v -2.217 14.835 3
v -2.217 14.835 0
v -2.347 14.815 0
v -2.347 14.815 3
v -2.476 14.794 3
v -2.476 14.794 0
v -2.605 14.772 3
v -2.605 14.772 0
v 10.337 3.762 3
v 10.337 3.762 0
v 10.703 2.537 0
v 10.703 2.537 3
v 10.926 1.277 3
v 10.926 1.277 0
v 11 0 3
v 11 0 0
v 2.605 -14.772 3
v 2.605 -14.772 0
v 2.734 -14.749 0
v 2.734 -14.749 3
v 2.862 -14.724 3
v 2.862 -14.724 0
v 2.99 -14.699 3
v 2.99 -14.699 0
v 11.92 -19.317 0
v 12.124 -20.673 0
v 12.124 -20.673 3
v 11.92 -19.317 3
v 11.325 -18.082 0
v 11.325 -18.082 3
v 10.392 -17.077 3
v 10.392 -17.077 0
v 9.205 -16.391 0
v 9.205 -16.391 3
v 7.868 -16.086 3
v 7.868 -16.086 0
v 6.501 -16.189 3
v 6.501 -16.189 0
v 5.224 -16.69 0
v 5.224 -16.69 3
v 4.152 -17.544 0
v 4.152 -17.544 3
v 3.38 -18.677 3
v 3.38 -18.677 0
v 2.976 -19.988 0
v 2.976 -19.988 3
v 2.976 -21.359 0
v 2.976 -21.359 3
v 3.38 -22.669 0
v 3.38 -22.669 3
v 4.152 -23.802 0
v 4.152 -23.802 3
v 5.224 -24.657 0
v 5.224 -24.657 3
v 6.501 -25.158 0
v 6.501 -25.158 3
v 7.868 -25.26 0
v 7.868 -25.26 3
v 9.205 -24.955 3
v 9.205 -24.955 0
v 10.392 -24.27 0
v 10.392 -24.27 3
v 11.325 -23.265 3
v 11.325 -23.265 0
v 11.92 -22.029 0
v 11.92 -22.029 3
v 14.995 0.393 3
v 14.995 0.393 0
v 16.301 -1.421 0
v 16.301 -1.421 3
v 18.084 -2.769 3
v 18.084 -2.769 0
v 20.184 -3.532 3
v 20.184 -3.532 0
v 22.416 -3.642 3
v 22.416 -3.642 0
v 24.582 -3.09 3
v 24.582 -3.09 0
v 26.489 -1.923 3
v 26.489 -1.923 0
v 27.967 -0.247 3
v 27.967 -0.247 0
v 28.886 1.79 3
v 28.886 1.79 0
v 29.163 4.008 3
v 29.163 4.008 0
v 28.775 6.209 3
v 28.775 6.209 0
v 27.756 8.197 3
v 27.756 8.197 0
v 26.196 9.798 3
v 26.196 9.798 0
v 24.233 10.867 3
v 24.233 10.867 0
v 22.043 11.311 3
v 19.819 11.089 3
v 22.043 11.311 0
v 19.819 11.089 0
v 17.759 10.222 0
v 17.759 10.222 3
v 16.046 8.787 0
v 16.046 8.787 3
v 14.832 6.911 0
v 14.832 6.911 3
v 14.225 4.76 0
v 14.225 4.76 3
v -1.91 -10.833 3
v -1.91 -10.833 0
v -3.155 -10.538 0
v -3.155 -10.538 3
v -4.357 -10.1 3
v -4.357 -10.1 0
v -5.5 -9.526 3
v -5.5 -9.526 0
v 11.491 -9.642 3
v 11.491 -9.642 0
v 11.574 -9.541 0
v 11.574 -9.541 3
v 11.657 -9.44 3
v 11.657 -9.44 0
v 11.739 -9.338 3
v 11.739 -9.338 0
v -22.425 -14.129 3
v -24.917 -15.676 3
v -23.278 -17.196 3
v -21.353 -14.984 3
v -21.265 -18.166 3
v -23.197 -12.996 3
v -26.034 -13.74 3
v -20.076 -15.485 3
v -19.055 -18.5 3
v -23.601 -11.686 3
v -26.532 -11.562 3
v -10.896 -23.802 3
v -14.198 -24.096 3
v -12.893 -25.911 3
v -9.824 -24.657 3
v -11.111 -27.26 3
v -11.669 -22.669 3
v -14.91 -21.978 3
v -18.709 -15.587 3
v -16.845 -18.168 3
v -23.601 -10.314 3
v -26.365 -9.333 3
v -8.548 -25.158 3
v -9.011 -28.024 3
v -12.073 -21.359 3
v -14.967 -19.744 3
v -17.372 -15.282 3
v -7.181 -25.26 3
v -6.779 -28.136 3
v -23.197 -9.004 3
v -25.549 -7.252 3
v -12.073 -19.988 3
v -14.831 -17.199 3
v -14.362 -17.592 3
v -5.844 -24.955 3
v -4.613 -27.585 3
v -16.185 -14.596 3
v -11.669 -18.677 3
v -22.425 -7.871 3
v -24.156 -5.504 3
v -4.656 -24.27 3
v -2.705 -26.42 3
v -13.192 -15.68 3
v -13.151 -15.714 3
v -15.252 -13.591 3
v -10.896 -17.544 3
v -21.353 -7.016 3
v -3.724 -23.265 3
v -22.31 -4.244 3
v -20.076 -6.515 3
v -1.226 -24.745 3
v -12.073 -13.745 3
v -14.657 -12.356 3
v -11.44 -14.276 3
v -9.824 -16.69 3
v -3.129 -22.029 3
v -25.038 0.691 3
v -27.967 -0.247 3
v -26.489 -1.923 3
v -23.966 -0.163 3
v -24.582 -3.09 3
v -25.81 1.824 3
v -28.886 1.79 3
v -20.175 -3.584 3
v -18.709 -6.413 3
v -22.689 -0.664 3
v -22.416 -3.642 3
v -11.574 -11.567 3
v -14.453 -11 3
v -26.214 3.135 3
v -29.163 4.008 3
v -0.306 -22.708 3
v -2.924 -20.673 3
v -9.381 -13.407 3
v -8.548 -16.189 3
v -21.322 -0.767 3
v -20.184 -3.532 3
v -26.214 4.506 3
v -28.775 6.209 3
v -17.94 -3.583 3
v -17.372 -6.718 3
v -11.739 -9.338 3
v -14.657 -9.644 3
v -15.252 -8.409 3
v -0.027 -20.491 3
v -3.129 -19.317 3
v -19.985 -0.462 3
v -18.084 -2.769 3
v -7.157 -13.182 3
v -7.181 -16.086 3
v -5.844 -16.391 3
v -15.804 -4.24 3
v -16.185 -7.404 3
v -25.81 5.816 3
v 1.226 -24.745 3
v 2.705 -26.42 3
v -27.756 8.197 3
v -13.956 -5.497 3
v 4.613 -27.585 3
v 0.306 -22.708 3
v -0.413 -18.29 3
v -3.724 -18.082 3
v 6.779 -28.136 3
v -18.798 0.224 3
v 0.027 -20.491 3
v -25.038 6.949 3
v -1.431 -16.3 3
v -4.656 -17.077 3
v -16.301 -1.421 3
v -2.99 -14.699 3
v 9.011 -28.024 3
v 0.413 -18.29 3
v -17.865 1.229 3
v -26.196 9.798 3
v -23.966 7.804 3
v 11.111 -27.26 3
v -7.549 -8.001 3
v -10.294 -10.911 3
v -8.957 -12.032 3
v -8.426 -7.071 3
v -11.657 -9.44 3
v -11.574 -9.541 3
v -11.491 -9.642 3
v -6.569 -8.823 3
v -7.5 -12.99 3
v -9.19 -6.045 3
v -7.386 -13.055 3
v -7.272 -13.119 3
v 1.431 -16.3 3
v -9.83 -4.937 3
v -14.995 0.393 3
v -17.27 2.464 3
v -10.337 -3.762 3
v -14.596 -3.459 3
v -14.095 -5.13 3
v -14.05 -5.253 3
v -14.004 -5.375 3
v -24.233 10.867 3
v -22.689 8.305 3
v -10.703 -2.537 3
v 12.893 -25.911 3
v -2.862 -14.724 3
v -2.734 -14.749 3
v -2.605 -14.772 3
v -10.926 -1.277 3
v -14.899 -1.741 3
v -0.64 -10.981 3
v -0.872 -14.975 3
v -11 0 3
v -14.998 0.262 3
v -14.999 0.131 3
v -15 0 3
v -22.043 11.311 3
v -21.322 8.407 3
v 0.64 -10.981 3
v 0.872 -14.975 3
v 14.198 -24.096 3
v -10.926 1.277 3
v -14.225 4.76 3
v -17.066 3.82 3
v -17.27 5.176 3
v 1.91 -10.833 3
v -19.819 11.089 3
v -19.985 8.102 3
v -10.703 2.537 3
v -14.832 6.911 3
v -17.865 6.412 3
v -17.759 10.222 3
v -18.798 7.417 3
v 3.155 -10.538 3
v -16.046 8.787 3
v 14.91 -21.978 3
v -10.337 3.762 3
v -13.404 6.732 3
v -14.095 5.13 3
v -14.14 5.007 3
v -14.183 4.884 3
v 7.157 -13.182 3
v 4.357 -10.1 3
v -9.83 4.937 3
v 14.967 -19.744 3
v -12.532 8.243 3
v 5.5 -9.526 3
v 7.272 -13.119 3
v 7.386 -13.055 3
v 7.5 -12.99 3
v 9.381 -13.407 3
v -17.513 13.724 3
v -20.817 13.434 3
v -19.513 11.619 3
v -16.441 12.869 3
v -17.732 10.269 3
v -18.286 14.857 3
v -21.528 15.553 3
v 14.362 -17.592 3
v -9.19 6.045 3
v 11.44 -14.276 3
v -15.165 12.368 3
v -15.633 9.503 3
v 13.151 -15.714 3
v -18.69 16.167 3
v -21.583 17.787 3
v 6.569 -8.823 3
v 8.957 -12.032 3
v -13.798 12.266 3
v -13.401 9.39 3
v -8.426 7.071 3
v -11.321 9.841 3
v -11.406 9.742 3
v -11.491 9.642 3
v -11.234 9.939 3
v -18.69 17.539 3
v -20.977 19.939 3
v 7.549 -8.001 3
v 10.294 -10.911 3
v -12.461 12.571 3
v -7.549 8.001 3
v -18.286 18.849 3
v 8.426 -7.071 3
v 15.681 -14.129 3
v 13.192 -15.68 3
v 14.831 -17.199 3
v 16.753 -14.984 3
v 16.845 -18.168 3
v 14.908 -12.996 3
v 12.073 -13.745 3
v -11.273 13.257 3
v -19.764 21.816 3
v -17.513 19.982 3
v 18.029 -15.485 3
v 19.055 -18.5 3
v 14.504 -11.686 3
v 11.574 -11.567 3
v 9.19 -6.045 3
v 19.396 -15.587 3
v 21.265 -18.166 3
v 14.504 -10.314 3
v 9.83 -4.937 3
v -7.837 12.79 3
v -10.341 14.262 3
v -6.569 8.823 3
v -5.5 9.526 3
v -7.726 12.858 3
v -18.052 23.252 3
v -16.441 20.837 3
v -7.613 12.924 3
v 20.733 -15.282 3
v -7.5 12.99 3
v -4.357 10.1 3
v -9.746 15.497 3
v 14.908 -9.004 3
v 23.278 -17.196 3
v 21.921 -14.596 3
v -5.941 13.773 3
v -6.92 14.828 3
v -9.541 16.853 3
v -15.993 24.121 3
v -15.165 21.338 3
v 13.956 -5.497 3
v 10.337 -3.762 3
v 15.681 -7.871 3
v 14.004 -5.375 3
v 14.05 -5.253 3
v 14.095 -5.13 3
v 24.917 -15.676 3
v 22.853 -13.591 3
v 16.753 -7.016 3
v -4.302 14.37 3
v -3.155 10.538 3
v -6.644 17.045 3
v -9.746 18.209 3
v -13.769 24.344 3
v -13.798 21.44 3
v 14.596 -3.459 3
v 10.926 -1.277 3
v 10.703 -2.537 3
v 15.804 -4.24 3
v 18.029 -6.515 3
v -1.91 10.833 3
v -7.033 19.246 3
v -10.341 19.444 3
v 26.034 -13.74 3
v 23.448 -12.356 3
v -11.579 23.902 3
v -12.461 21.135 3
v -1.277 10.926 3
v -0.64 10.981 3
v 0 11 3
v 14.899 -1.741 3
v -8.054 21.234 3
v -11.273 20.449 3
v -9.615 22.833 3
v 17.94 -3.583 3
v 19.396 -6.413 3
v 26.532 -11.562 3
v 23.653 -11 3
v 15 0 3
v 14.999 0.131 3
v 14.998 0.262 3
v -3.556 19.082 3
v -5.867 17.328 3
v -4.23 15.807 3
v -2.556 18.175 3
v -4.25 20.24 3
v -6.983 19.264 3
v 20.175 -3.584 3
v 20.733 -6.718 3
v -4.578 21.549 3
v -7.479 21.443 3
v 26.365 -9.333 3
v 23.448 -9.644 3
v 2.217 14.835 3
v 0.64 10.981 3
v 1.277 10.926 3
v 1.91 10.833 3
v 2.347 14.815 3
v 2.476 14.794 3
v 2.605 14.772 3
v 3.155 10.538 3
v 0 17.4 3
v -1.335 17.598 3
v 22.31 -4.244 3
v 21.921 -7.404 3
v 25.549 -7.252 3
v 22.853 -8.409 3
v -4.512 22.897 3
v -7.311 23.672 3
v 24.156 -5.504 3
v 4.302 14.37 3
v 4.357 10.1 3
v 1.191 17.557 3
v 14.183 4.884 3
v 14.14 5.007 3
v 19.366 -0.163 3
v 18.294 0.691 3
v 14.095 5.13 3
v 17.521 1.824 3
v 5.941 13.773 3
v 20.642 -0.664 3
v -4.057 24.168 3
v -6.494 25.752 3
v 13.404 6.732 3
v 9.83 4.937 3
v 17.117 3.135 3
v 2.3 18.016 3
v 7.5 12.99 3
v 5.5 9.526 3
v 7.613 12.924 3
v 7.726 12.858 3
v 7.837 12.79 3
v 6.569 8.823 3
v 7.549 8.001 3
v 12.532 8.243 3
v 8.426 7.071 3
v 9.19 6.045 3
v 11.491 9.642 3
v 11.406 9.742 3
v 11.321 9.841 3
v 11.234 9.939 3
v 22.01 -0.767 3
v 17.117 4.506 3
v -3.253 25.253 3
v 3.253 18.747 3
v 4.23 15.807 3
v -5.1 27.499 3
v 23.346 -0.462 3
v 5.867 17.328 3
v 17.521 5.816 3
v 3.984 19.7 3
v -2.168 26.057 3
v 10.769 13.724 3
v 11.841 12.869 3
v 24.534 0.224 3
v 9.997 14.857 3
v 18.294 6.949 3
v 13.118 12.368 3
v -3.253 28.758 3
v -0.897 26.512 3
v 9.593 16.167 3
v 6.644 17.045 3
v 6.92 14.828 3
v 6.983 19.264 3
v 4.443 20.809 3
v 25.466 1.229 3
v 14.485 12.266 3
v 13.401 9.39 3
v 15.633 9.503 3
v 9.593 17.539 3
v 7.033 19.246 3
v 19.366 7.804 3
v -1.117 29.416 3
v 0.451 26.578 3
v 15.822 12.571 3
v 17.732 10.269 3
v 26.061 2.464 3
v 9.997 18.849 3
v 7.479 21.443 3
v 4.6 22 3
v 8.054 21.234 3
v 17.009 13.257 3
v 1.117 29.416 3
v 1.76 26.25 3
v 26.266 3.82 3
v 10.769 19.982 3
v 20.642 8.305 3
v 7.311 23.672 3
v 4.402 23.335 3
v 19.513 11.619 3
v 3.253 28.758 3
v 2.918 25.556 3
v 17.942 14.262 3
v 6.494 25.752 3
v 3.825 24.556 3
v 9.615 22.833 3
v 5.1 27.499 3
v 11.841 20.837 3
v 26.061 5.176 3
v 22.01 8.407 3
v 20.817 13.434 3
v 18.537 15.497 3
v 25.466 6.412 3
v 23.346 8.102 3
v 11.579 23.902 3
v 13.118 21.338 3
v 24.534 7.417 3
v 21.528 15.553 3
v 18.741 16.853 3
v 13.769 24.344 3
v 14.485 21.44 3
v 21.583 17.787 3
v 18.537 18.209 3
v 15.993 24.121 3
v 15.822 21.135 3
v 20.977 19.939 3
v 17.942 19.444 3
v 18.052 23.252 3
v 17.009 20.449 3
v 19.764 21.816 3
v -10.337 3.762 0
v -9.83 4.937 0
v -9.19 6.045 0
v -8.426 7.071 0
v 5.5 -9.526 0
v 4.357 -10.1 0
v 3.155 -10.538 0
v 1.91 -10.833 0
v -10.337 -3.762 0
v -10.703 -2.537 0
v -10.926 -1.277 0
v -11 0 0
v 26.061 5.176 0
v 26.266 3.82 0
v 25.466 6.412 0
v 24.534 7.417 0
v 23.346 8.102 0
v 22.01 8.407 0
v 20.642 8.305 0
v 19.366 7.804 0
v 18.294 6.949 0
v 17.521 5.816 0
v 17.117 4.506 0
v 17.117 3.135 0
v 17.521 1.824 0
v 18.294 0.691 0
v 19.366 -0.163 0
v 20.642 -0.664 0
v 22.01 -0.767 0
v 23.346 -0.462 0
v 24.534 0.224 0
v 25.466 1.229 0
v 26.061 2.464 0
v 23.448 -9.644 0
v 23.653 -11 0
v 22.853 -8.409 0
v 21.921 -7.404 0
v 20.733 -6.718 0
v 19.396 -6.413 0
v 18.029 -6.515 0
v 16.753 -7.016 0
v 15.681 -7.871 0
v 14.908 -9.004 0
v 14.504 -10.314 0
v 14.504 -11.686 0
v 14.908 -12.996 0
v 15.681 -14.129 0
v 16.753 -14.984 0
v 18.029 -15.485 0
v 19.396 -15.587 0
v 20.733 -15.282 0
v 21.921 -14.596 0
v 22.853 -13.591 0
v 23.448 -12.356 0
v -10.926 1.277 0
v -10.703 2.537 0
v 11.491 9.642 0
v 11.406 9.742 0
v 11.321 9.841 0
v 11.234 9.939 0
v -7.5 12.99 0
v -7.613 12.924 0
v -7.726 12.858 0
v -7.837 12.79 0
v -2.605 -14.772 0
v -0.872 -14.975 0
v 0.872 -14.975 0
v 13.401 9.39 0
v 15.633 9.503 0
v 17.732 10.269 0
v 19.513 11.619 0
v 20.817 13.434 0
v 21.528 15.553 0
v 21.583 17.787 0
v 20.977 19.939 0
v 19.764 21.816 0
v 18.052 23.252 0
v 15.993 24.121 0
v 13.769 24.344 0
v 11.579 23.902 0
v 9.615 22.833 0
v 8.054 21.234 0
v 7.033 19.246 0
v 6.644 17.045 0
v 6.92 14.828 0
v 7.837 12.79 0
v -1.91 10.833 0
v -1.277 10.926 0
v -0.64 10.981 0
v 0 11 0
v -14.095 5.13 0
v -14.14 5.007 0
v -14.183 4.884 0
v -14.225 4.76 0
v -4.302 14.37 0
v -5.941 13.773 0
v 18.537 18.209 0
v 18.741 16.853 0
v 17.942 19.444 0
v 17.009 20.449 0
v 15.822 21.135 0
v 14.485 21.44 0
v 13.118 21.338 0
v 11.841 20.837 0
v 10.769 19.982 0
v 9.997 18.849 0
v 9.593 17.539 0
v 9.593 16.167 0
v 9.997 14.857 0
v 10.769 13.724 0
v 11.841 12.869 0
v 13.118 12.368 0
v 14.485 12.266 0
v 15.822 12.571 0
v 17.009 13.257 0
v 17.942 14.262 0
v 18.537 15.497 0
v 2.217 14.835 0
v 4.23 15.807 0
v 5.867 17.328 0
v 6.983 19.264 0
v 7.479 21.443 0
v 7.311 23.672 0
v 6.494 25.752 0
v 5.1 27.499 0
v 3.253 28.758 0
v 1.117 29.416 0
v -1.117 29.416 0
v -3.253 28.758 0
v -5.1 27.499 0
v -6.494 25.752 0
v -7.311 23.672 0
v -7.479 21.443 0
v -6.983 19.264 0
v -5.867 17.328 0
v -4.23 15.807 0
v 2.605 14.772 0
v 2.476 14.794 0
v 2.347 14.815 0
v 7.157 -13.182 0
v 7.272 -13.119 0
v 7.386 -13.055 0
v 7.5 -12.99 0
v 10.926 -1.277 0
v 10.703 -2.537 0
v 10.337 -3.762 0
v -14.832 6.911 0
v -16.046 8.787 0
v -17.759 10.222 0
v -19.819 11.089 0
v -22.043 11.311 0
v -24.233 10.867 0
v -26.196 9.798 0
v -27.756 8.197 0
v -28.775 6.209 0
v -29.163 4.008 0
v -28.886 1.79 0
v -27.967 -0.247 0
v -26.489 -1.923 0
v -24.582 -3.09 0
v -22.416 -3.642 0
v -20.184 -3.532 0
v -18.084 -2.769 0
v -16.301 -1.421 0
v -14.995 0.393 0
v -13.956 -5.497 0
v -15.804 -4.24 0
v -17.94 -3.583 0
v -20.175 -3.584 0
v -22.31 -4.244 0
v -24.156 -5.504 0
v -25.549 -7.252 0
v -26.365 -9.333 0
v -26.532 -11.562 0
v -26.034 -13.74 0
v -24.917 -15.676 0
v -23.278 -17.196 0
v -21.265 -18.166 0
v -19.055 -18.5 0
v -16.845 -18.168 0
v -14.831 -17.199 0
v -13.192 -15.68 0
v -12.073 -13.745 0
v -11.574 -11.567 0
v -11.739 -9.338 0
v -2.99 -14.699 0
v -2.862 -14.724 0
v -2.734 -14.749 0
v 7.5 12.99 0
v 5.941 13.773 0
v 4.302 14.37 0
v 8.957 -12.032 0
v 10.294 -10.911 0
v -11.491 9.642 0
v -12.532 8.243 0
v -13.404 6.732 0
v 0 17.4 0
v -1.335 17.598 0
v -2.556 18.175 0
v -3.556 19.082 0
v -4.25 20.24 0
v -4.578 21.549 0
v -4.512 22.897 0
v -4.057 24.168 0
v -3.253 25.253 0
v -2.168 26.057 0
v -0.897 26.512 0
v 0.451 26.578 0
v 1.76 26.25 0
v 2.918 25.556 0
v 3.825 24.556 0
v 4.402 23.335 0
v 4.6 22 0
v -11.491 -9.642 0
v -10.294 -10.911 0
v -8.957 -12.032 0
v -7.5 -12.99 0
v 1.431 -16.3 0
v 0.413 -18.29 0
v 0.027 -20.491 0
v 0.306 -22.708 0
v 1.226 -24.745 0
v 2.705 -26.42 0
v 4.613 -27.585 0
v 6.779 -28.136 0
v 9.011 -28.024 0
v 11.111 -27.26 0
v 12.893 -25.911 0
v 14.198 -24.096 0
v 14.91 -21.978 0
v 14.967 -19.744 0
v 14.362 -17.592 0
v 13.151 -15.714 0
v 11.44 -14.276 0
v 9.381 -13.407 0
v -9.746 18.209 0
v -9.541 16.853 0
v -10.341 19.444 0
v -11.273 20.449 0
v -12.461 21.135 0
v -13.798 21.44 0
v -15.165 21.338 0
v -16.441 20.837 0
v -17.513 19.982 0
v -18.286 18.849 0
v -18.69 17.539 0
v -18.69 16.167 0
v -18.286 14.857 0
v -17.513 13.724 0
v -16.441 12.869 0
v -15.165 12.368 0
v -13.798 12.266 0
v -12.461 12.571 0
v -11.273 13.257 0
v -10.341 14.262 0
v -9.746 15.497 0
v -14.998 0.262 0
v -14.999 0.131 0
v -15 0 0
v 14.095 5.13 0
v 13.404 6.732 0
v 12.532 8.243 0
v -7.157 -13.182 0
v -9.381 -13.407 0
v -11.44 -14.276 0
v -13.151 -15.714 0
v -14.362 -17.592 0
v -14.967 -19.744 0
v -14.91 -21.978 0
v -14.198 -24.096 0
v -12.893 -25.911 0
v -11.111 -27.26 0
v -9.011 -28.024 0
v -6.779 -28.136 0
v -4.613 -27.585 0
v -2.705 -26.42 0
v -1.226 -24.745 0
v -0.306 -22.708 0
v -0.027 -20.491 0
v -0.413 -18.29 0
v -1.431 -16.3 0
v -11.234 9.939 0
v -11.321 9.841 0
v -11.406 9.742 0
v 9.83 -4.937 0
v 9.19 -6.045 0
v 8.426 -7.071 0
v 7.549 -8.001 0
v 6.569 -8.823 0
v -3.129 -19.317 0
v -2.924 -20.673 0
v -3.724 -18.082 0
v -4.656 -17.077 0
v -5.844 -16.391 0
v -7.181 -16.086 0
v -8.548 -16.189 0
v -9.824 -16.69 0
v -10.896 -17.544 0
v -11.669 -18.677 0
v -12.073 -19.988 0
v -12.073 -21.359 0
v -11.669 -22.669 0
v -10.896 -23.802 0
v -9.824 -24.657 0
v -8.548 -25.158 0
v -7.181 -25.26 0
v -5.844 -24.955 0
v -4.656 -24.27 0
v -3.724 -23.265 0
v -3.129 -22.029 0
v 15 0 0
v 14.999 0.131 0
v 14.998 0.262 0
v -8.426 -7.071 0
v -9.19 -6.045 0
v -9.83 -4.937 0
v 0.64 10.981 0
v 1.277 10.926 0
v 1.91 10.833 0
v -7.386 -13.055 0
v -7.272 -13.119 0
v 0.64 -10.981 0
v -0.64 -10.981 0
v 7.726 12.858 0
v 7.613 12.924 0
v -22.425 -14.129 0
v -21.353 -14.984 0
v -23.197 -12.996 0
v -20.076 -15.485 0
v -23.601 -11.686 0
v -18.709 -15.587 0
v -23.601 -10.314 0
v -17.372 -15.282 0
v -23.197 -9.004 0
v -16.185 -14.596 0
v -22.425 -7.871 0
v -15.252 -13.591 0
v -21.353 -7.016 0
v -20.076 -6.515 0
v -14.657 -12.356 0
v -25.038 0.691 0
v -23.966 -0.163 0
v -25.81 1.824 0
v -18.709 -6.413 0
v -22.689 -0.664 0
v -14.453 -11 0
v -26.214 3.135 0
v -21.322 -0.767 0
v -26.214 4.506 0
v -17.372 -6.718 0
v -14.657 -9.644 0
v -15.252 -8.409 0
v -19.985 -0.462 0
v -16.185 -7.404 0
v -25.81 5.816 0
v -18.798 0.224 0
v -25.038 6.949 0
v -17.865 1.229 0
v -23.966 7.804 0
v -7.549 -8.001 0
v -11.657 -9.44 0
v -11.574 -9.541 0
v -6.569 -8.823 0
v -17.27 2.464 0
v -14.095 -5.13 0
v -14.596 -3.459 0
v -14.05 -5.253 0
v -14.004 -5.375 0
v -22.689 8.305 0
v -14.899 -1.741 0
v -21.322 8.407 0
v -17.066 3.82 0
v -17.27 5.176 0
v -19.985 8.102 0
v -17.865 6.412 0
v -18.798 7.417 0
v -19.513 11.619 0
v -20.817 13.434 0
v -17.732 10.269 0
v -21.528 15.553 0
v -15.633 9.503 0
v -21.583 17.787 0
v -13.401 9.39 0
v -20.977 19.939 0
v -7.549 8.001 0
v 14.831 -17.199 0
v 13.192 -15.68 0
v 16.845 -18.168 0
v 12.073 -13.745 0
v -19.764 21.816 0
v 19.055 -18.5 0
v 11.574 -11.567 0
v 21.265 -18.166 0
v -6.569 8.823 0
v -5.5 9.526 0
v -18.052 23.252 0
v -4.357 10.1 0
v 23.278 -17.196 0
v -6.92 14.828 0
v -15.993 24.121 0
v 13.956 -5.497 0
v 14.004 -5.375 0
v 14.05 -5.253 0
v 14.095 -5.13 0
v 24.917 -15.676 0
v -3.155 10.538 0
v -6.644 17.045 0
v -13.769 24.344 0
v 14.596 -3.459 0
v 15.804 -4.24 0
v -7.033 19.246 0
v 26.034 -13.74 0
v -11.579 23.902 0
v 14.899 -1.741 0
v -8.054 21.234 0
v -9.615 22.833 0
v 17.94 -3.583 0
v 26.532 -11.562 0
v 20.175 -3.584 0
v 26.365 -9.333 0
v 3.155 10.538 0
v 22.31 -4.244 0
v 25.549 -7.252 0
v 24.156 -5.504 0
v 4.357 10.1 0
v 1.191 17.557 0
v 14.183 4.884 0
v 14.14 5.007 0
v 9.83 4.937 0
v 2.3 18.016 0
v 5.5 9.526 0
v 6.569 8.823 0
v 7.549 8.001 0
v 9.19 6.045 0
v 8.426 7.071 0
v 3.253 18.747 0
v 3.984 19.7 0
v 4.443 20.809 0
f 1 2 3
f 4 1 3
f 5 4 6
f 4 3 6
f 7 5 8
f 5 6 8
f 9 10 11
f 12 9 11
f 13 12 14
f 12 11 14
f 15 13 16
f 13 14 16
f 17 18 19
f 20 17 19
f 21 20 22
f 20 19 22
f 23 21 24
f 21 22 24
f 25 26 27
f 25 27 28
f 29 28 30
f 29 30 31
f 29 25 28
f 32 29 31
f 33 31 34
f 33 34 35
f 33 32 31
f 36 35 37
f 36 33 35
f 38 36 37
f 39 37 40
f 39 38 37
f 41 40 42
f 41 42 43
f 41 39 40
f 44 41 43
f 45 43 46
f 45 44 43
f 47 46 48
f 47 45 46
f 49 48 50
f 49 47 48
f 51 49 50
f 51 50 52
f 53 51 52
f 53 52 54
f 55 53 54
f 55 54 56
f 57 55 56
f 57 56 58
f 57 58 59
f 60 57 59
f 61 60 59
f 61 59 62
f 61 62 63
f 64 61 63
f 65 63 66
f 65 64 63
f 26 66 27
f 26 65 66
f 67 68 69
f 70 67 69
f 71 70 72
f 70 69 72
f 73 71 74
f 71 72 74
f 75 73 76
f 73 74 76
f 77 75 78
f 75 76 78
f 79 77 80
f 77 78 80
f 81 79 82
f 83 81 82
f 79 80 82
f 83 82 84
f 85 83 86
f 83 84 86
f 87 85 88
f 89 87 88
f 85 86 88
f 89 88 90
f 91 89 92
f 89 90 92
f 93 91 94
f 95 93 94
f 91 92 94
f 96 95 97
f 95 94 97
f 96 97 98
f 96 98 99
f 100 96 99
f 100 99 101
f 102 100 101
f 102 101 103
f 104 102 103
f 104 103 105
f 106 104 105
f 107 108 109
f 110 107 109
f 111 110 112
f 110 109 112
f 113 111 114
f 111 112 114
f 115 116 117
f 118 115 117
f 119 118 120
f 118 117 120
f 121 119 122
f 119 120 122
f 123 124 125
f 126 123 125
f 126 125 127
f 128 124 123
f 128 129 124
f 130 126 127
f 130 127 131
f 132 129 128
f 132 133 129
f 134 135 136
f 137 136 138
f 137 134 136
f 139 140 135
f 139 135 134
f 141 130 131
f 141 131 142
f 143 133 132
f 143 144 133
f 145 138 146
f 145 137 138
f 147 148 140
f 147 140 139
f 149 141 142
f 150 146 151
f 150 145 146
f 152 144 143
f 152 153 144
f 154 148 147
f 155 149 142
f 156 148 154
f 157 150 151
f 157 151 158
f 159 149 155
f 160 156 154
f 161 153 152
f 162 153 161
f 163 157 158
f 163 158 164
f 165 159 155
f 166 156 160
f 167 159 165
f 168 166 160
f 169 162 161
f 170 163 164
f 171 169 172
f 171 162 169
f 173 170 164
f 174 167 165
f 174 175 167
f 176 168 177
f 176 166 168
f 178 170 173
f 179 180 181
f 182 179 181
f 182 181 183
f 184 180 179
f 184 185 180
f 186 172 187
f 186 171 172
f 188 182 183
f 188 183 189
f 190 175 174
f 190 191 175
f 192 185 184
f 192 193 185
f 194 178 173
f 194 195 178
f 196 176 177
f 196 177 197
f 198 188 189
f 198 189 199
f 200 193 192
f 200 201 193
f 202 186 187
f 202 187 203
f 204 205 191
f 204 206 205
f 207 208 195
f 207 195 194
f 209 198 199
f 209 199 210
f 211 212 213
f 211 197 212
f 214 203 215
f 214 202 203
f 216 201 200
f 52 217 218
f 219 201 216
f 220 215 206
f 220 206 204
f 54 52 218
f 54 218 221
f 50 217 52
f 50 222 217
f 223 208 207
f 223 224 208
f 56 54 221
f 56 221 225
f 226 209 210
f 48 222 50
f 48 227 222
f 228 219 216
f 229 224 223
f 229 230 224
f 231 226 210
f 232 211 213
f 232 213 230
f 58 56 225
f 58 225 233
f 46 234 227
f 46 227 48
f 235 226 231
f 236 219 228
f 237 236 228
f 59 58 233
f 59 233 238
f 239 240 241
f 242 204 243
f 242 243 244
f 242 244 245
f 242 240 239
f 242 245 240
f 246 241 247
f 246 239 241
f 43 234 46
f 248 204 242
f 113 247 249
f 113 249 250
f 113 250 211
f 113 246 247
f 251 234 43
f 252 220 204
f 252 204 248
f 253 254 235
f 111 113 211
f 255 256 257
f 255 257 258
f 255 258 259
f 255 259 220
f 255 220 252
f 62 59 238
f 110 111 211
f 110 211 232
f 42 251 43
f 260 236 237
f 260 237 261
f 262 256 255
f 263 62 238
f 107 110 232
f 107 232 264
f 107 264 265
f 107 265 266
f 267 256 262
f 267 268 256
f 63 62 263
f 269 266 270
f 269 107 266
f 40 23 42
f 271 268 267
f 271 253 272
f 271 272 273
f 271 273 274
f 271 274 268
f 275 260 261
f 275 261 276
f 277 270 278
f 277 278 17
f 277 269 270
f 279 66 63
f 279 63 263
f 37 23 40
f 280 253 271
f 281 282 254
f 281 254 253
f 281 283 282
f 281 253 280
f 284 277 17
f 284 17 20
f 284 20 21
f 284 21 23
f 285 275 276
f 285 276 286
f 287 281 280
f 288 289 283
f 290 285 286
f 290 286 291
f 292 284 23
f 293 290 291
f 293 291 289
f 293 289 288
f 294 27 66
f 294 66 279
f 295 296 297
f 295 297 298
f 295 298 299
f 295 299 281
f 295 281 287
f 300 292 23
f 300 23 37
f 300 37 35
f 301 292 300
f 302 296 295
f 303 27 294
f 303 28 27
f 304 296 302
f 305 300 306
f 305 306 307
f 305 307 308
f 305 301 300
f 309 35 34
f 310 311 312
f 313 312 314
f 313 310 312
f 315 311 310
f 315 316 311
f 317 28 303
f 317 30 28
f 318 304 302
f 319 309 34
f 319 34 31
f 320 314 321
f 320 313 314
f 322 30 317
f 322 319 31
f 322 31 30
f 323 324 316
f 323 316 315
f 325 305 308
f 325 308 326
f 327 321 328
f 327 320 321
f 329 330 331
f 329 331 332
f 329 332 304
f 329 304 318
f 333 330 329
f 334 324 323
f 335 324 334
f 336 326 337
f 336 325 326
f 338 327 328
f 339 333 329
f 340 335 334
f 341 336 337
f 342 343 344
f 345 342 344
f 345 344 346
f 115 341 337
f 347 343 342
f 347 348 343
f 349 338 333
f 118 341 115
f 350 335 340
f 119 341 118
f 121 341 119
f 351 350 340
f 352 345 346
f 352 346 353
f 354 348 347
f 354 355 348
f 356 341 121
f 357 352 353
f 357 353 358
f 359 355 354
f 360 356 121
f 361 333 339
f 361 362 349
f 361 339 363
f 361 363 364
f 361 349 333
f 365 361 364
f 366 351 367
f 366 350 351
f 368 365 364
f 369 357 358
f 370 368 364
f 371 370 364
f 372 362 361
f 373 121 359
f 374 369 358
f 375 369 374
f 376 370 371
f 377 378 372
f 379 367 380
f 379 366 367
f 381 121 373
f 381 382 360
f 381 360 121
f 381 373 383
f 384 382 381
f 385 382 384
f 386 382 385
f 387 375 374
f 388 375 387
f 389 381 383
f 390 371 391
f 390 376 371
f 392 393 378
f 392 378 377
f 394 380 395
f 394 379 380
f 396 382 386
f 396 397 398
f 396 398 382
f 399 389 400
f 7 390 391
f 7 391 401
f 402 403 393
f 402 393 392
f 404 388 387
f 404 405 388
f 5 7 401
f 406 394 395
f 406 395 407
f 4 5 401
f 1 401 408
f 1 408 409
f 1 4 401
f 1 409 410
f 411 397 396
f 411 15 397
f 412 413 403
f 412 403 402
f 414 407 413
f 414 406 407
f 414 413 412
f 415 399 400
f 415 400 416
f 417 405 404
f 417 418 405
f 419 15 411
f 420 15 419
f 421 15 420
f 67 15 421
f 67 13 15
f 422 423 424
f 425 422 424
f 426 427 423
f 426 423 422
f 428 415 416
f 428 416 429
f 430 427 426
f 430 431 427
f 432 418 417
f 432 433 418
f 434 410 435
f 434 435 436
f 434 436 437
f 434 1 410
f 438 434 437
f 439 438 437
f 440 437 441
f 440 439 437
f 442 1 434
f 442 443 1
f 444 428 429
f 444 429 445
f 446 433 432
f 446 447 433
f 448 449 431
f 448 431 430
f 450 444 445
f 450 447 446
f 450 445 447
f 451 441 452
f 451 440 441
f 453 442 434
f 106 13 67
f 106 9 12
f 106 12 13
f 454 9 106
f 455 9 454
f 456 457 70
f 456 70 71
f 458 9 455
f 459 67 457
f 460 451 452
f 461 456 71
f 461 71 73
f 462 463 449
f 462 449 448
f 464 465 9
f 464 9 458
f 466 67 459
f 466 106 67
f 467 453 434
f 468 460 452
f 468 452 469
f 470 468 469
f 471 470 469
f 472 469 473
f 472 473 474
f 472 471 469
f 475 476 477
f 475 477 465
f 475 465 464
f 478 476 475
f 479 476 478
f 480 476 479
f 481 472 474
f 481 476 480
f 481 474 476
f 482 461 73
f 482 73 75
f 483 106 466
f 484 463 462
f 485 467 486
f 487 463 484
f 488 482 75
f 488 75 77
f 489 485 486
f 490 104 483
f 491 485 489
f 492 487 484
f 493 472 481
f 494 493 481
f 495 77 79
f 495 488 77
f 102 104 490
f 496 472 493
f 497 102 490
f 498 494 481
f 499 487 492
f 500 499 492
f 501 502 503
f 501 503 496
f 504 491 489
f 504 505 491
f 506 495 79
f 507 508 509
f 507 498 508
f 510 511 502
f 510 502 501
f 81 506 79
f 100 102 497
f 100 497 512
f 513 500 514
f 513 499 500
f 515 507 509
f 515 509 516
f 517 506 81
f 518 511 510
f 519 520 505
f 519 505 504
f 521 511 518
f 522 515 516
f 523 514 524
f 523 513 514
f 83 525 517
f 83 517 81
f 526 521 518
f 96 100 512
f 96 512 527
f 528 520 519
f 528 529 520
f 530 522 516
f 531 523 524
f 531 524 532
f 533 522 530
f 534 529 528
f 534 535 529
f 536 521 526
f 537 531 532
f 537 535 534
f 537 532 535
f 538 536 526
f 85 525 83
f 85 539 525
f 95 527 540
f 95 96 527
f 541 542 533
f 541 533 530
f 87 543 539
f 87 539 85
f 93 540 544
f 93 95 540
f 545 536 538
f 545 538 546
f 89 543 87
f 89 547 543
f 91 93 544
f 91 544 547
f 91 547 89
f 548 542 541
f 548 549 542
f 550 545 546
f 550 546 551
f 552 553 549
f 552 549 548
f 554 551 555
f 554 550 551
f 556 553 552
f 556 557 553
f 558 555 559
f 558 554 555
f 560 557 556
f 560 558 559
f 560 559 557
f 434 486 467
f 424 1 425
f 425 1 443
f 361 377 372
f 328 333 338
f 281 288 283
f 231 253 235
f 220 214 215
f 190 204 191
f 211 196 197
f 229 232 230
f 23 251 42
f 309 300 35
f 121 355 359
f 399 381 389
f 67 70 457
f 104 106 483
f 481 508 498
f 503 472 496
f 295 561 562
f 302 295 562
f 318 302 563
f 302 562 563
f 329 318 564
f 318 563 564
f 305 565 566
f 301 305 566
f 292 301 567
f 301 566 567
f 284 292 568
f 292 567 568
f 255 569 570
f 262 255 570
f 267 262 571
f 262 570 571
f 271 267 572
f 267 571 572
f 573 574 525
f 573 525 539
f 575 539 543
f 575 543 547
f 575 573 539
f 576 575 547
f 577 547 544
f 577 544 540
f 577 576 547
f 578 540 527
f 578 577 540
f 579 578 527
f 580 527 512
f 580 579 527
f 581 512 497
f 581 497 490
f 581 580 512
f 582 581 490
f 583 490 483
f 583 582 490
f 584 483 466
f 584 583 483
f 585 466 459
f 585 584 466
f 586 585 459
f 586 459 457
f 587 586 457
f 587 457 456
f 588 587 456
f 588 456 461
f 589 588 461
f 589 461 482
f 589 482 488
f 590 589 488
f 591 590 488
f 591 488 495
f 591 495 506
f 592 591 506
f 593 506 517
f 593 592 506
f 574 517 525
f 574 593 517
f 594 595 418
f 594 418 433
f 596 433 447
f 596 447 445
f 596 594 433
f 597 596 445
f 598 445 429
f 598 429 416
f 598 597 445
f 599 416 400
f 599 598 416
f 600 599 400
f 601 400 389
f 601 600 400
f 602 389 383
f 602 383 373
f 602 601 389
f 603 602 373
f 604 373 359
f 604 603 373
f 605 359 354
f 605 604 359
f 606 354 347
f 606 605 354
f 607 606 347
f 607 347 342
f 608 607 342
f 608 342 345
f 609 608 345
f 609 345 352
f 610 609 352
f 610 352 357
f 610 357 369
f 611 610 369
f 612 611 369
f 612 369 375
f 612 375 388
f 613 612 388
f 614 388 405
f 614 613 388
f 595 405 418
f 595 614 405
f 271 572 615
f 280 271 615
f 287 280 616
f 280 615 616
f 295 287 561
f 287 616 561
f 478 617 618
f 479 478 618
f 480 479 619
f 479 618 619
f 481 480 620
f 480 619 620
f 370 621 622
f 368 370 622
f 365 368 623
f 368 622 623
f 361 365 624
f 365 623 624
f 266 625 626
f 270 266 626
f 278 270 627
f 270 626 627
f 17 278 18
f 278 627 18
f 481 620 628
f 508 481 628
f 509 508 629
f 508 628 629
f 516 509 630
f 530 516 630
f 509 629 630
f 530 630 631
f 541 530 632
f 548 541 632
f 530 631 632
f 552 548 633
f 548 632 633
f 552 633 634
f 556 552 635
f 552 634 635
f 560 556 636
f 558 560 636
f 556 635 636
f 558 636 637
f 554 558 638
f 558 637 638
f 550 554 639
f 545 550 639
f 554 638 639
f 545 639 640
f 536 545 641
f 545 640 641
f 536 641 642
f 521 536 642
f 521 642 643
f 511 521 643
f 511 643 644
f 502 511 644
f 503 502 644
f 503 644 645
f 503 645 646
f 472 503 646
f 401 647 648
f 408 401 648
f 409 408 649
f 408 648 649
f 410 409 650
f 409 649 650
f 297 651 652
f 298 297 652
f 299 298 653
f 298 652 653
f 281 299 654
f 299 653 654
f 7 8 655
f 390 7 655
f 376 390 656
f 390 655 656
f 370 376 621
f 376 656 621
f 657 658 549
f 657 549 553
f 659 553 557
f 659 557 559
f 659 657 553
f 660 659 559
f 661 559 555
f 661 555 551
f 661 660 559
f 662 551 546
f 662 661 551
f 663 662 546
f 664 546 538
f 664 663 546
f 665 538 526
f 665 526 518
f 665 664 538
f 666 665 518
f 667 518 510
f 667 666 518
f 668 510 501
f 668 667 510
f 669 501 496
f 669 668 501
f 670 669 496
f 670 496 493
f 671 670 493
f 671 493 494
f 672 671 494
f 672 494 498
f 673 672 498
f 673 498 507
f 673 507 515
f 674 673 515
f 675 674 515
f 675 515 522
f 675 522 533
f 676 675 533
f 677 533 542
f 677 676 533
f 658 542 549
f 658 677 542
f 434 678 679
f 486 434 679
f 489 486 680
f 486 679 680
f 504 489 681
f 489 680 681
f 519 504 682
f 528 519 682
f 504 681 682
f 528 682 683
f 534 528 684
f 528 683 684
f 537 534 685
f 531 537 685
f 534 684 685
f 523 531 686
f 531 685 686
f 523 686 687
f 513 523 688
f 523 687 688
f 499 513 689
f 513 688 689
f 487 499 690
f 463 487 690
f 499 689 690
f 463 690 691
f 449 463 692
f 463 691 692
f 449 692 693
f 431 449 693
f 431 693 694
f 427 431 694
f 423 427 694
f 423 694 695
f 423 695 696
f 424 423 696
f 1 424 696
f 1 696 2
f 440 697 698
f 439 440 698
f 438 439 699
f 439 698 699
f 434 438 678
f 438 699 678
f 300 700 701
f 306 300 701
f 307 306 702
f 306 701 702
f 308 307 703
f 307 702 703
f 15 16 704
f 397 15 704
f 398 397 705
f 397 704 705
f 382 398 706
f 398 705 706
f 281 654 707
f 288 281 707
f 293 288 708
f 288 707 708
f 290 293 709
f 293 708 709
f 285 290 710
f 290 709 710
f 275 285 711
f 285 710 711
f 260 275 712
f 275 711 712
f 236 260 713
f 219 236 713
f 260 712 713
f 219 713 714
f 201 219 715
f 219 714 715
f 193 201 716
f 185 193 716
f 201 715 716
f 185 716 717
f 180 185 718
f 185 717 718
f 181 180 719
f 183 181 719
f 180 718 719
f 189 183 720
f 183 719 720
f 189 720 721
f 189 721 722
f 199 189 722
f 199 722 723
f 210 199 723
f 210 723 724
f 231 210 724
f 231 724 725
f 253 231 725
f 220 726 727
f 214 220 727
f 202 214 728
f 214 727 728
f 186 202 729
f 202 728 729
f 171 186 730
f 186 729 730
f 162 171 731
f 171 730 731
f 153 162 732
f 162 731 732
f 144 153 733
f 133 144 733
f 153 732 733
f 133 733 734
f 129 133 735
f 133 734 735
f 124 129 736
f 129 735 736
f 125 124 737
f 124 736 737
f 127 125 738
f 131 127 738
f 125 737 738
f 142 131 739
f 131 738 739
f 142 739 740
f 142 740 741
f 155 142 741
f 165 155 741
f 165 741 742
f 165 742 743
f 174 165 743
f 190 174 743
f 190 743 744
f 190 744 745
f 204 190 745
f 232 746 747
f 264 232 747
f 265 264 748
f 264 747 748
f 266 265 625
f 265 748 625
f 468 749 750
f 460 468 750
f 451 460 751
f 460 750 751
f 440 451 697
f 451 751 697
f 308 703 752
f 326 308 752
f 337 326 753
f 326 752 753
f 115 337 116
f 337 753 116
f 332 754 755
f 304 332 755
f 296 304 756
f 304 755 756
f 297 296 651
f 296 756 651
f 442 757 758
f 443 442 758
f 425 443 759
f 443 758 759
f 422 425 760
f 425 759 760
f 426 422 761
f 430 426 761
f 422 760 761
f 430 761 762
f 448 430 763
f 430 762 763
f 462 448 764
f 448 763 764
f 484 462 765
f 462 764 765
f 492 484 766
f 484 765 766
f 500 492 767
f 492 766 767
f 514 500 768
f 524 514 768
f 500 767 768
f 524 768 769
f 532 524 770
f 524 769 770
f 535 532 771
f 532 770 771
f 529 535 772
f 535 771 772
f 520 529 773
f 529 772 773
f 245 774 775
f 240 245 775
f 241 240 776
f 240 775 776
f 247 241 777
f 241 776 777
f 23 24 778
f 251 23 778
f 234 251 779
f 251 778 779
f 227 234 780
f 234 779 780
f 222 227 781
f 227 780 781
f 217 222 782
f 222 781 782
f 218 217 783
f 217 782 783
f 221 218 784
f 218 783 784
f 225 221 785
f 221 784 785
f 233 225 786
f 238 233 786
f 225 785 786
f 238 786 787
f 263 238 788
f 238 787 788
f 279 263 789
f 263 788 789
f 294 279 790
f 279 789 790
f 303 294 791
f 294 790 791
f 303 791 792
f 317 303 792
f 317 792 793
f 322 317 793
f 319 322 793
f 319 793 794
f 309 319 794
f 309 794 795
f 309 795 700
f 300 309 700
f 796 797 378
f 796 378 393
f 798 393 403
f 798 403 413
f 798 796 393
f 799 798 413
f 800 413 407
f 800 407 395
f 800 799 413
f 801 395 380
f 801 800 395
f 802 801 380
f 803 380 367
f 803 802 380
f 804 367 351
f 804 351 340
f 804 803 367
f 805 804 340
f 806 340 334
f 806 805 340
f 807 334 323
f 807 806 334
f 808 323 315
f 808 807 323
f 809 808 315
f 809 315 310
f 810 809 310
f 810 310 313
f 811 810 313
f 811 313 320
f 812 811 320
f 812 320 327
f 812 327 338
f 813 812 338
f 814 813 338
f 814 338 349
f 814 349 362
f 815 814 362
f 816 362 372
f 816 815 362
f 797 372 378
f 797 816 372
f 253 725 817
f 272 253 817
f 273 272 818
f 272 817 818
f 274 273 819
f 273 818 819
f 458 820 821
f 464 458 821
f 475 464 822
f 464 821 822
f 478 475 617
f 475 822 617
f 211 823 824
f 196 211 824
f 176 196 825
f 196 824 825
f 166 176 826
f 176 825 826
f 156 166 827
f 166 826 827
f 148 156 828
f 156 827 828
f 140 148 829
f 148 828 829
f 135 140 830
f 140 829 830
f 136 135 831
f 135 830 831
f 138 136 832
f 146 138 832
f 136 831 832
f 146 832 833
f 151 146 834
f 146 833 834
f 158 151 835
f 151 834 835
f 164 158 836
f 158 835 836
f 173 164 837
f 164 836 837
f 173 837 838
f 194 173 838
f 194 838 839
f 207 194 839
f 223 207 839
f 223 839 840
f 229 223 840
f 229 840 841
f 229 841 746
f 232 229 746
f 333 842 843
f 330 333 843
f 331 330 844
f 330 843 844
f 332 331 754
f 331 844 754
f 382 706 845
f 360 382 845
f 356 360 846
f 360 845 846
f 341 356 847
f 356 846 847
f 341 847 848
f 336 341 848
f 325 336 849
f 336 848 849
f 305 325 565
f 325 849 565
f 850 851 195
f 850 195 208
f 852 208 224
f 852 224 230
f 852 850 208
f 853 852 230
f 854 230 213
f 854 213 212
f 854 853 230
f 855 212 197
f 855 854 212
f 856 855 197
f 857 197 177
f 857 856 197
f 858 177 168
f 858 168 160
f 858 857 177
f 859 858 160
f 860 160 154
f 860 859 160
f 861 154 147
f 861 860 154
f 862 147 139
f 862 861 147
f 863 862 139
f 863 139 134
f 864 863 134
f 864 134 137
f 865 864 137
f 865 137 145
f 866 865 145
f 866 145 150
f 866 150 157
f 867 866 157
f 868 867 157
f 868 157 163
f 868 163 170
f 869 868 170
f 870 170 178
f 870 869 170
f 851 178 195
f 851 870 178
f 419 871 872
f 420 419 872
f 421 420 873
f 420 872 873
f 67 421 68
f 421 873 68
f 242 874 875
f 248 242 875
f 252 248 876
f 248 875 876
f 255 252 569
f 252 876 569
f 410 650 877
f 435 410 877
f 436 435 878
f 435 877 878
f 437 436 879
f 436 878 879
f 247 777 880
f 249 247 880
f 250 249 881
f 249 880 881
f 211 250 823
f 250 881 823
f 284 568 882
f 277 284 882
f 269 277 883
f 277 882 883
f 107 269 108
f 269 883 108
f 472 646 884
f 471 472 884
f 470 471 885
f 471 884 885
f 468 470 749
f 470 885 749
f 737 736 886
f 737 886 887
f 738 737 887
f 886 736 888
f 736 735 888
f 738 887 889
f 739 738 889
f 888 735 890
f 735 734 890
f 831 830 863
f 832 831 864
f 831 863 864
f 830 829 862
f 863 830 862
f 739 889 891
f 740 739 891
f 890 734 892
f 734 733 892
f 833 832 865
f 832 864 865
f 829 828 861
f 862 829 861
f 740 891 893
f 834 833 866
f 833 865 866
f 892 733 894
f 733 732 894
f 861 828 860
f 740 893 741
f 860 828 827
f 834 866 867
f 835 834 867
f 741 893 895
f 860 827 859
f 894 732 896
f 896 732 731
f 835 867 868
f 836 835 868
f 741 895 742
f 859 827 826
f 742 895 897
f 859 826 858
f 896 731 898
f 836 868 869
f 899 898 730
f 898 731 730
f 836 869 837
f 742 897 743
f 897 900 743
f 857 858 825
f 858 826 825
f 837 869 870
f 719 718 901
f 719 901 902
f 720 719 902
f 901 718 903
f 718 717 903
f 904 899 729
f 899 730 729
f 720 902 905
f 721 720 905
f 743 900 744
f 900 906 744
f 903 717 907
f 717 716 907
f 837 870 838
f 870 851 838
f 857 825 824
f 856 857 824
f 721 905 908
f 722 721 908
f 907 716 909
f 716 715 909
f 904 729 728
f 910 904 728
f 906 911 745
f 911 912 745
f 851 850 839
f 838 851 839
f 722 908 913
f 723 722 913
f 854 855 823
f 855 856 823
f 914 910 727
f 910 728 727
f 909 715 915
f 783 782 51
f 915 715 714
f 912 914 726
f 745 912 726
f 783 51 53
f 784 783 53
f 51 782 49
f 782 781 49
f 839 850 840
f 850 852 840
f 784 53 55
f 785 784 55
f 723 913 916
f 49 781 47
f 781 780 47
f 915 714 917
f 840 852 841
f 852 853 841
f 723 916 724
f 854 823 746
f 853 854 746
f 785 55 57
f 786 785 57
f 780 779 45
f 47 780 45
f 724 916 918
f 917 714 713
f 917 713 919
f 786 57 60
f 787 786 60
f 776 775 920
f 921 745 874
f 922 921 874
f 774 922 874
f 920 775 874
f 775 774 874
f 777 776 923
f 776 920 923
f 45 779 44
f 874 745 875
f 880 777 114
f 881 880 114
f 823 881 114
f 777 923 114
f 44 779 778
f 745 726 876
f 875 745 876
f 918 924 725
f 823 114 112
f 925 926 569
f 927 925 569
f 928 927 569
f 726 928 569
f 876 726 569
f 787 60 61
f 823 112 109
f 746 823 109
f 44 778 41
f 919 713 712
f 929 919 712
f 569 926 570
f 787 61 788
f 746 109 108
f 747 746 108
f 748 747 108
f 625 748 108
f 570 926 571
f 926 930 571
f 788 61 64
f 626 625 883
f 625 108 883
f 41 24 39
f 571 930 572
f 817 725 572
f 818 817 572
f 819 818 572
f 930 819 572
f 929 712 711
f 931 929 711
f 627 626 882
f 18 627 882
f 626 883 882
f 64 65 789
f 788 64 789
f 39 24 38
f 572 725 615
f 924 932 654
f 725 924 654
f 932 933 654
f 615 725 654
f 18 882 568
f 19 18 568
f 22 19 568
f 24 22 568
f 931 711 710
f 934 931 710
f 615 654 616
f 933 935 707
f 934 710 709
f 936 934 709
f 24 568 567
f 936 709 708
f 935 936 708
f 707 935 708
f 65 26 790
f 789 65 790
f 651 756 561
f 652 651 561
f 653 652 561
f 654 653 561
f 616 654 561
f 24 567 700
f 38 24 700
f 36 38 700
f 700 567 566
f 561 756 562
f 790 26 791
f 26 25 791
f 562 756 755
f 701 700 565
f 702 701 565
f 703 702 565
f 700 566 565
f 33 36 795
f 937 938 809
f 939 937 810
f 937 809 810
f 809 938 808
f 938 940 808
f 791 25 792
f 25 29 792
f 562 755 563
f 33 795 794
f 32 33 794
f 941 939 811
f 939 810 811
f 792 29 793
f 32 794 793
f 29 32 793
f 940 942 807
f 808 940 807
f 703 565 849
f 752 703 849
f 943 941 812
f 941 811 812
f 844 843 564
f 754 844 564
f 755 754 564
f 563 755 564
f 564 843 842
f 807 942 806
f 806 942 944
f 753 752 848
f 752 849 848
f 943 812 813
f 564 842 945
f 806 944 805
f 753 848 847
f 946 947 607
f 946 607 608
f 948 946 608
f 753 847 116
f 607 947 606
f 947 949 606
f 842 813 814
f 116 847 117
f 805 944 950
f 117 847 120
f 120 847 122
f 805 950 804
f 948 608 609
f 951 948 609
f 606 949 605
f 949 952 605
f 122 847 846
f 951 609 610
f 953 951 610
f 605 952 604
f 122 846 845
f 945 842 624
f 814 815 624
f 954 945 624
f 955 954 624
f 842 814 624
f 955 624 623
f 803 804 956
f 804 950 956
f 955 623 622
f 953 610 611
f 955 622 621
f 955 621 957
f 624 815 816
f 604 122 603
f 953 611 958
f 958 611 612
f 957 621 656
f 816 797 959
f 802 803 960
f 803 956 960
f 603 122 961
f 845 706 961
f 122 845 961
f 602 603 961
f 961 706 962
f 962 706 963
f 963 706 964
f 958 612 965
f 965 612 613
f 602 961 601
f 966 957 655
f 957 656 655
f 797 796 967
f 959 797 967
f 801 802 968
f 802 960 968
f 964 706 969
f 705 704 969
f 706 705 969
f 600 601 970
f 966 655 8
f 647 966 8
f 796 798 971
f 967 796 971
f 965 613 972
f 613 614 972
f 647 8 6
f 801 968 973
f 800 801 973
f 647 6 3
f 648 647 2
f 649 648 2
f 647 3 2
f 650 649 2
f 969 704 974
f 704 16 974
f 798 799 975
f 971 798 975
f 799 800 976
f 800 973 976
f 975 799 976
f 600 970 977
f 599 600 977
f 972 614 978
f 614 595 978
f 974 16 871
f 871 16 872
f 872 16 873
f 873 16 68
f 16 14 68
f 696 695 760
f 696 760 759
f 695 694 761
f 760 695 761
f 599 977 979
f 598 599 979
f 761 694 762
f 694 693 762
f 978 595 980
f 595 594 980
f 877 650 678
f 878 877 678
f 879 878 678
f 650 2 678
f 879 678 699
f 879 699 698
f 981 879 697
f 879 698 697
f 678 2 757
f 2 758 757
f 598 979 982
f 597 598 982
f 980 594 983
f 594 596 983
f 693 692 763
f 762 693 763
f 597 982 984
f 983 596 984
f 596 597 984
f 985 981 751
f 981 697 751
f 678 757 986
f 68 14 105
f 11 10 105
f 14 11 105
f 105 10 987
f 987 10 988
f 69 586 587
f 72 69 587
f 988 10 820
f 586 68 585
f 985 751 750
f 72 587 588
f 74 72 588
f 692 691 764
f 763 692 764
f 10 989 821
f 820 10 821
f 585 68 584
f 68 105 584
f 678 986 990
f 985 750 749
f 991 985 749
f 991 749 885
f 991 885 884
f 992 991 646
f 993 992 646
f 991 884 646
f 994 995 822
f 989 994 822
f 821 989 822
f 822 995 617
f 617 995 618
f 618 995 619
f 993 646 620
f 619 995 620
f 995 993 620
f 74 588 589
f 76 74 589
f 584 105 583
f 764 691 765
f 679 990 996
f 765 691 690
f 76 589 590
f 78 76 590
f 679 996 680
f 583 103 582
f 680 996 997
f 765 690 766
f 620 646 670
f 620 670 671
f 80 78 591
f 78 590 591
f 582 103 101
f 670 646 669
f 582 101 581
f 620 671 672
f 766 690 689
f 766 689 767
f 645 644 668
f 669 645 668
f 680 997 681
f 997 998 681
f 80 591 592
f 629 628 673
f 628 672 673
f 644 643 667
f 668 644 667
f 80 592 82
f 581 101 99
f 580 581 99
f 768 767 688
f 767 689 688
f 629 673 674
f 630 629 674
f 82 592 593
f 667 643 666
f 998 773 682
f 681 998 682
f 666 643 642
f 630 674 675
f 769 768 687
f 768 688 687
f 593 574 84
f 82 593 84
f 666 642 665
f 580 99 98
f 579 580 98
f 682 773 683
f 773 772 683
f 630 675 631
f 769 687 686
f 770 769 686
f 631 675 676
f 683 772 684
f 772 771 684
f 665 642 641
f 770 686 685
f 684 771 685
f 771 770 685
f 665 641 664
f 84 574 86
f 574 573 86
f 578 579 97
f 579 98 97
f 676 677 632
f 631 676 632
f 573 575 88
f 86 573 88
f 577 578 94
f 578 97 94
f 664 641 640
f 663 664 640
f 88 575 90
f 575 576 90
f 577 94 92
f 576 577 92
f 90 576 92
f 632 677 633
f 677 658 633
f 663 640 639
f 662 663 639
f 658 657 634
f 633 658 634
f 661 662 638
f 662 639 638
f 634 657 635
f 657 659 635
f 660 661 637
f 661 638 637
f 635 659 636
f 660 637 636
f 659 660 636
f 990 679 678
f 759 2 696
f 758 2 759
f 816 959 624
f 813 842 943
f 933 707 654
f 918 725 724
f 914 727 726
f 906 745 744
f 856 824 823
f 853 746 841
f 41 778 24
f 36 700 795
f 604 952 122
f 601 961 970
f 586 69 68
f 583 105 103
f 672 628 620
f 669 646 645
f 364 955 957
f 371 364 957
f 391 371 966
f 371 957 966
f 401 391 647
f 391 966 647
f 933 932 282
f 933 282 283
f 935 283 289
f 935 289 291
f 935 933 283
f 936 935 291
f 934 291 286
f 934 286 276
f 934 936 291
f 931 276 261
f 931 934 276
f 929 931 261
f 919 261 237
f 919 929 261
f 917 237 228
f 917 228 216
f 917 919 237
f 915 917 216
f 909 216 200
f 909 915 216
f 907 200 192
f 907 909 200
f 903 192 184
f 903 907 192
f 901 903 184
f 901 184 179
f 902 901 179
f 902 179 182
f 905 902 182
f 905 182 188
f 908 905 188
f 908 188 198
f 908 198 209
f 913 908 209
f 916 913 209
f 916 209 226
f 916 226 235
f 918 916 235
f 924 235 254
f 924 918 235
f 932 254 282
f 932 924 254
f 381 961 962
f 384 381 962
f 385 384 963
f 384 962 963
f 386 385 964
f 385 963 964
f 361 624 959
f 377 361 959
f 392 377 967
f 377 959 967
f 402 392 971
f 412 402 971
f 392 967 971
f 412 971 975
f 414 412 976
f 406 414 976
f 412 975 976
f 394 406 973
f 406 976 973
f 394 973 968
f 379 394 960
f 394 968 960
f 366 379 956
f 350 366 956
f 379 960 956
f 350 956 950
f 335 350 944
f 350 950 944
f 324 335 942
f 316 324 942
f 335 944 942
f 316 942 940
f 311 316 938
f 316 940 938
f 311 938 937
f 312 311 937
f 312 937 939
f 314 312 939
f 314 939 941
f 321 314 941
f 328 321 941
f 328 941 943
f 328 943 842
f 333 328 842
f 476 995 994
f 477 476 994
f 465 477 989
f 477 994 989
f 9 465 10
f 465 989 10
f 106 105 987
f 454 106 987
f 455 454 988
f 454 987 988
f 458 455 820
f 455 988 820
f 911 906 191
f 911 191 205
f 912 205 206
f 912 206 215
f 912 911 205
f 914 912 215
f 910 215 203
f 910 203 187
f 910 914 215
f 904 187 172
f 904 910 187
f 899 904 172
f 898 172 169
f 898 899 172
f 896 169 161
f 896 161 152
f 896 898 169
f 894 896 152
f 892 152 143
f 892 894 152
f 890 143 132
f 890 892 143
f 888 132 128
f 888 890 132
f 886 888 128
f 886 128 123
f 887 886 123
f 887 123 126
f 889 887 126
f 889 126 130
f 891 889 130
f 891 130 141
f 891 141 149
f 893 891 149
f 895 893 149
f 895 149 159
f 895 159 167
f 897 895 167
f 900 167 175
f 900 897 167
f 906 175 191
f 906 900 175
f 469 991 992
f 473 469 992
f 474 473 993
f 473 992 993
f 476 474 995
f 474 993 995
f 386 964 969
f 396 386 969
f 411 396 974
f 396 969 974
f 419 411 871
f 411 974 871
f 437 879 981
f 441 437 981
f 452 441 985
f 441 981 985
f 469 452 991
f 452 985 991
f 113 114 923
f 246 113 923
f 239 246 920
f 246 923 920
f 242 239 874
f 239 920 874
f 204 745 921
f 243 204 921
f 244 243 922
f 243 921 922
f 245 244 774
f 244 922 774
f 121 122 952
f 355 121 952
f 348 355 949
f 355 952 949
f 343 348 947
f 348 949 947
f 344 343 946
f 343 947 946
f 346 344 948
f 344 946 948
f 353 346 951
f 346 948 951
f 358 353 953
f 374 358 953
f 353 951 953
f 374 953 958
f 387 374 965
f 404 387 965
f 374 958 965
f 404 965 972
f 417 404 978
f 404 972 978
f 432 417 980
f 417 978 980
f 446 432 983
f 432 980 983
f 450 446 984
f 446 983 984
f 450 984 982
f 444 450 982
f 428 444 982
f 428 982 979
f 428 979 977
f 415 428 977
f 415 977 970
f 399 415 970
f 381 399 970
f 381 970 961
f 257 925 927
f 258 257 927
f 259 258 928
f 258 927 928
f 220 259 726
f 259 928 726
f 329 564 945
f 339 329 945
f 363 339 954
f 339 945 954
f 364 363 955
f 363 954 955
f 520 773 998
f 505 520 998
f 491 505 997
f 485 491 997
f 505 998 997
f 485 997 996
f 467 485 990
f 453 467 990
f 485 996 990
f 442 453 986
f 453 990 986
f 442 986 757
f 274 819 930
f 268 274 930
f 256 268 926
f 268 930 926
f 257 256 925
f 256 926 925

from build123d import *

# Parameters (mm, degrees)
F0_R     = 4.6
F1_DEPTH = 3


with BuildPart() as f1:
    # F0 (on Top) → F1 (new body)
    with BuildSketch(Plane.XY):
        with BuildLine():
            ThreePointArc((8.426489, 7.070664), (7.070664, 8.426489), (5.5, 9.526279))
            ThreePointArc((5.5, 9.526279), (3.762222, 10.336619), (1.91013, 10.832885))
            ThreePointArc((1.91013, 10.832885), (0.958713, 10.958142), (0, 11))
            ThreePointArc((0, 11), (-0.958713, 10.958142), (-1.91013, 10.832885))
            ThreePointArc((-1.91013, 10.832885), (-3.762222, 10.336619), (-5.5, 9.526279))
            ThreePointArc((-5.5, 9.526279), (-7.070664, 8.426489), (-8.426489, 7.070664))
            ThreePointArc((-8.426489, 7.070664), (-9.526279, 5.5), (-10.336619, 3.762222))
            ThreePointArc((-10.336619, 3.762222), (-10.832885, 1.91013), (-11, 0))
            ThreePointArc((-11, 0), (-10.832885, -1.91013), (-10.336619, -3.762222))
            ThreePointArc((-10.336619, -3.762222), (-9.526279, -5.5), (-8.426489, -7.070664))
            ThreePointArc((-8.426489, -7.070664), (-7.070664, -8.426489), (-5.5, -9.526279))
            ThreePointArc((-5.5, -9.526279), (-3.762222, -10.336619), (-1.91013, -10.832885))
            ThreePointArc((-1.91013, -10.832885), (0, -11), (1.91013, -10.832885))
            ThreePointArc((1.91013, -10.832885), (3.762222, -10.336619), (5.5, -9.526279))
            ThreePointArc((5.5, -9.526279), (7.070664, -8.426489), (8.426489, -7.070664))
            ThreePointArc((8.426489, -7.070664), (9.526279, -5.5), (10.336619, -3.762222))
            ThreePointArc((10.336619, -3.762222), (10.832885, -1.91013), (11, 0))
            ThreePointArc((11, 0), (10.832885, 1.91013), (10.336619, 3.762222))
            ThreePointArc((10.336619, 3.762222), (9.526279, 5.5), (8.426489, 7.070664))
        make_face()
        with BuildLine():
            ThreePointArc((4.6, 22), (-3.252691, 25.252691), (0, 17.4))
            ThreePointArc((0, 17.4), (3.252691, 18.747309), (4.6, 22))
        make_face()
        with BuildLine():
            ThreePointArc((2.217213, 14.835227), (0, 29.5), (-2.217213, 14.835227))
            ThreePointArc((-2.217213, 14.835227), (-2.411174, 14.80494), (-2.604723, 14.772116))
            ThreePointArc((-2.604723, 14.772116), (-5.130302, 14.095389), (-7.5, 12.990381))
            ThreePointArc((-7.5, 12.990381), (-7.669365, 12.891115), (-7.837417, 12.78964))
            ThreePointArc((-7.837417, 12.78964), (-18.962234, 22.598311), (-11.234384, 9.939247))
            ThreePointArc((-11.234384, 9.939247), (-11.363498, 9.791369), (-11.490667, 9.641814))
            ThreePointArc((-11.490667, 9.641814), (-12.990381, 7.5), (-14.095389, 5.130302))
            ThreePointArc((-14.095389, 5.130302), (-14.161323, 4.945394), (-14.224832, 4.759638))
            ThreePointArc((-14.224832, 4.759638), (-29.051829, 5.122621), (-14.994862, 0.392582))
            ThreePointArc((-14.994862, 0.392582), (-14.998715, 0.196308), (-15, 0))
            ThreePointArc((-15, 0), (-14.772116, -2.604723), (-14.095389, -5.130302))
            ThreePointArc((-14.095389, -5.130302), (-14.027041, -5.314332), (-13.95629, -5.497451))
            ThreePointArc((-13.95629, -5.497451), (-25.547749, -14.75), (-11.739077, -9.337776))
            ThreePointArc((-11.739077, -9.337776), (-11.615867, -9.490608), (-11.490667, -9.641814))
            ThreePointArc((-11.490667, -9.641814), (-9.641814, -11.490667), (-7.5, -12.990381))
            ThreePointArc((-7.5, -12.990381), (-7.32935, -13.087422), (-7.157445, -13.182222))
            ThreePointArc((-7.157445, -13.182222), (-10.089594, -27.720932), (-2.990448, -14.698885))
            ThreePointArc((-2.990448, -14.698885), (-2.797825, -14.736763), (-2.604723, -14.772116))
            ThreePointArc((-2.604723, -14.772116), (0, -15), (2.604723, -14.772116))
            ThreePointArc((2.604723, -14.772116), (2.797825, -14.736763), (2.990448, -14.698885))
            ThreePointArc((2.990448, -14.698885), (10.089594, -27.720932), (7.157445, -13.182222))
            ThreePointArc((7.157445, -13.182222), (7.32935, -13.087422), (7.5, -12.990381))
            ThreePointArc((7.5, -12.990381), (9.641814, -11.490667), (11.490667, -9.641814))
            ThreePointArc((11.490667, -9.641814), (11.615867, -9.490608), (11.739077, -9.337776))
            ThreePointArc((11.739077, -9.337776), (25.547749, -14.75), (13.95629, -5.497451))
            ThreePointArc((13.95629, -5.497451), (14.027041, -5.314332), (14.095389, -5.130302))
            ThreePointArc((14.095389, -5.130302), (14.772116, -2.604723), (15, 0))
            ThreePointArc((15, 0), (14.998715, 0.196308), (14.994862, 0.392582))
            ThreePointArc((14.994862, 0.392582), (29.051829, 5.122621), (14.224832, 4.759638))
            ThreePointArc((14.224832, 4.759638), (14.161323, 4.945394), (14.095389, 5.130302))
            ThreePointArc((14.095389, 5.130302), (12.990381, 7.5), (11.490667, 9.641814))
            ThreePointArc((11.490667, 9.641814), (11.363498, 9.791369), (11.234384, 9.939247))
            ThreePointArc((11.234384, 9.939247), (18.962234, 22.598311), (7.837417, 12.78964))
            ThreePointArc((7.837417, 12.78964), (7.669365, 12.891115), (7.5, 12.990381))
            ThreePointArc((7.5, 12.990381), (5.130302, 14.095389), (2.604723, 14.772116))
            ThreePointArc((2.604723, 14.772116), (2.411174, 14.80494), (2.217213, 14.835227))
        make_face()
        with Locations((-7.524443, -20.673238)):
            Circle(F0_R, mode=Mode.SUBTRACT)
        with Locations((-19.052559, -11)):
            Circle(F0_R, mode=Mode.SUBTRACT)
        with Locations((7.524443, -20.673238)):
            Circle(F0_R, mode=Mode.SUBTRACT)
        with BuildLine():
            ThreePointArc((1.91013, 10.832885), (3.762222, 10.336619), (5.5, 9.526279))
            ThreePointArc((5.5, 9.526279), (7.070664, 8.426489), (8.426489, 7.070664))
            ThreePointArc((8.426489, 7.070664), (9.526279, 5.5), (10.336619, 3.762222))
            ThreePointArc((10.336619, 3.762222), (10.832885, 1.91013), (11, 0))
            ThreePointArc((11, 0), (10.832885, -1.91013), (10.336619, -3.762222))
            ThreePointArc((10.336619, -3.762222), (9.526279, -5.5), (8.426489, -7.070664))
            ThreePointArc((8.426489, -7.070664), (7.070664, -8.426489), (5.5, -9.526279))
            ThreePointArc((5.5, -9.526279), (3.762222, -10.336619), (1.91013, -10.832885))
            ThreePointArc((1.91013, -10.832885), (0, -11), (-1.91013, -10.832885))
            ThreePointArc((-1.91013, -10.832885), (-3.762222, -10.336619), (-5.5, -9.526279))
            ThreePointArc((-5.5, -9.526279), (-7.070664, -8.426489), (-8.426489, -7.070664))
            ThreePointArc((-8.426489, -7.070664), (-9.526279, -5.5), (-10.336619, -3.762222))
            ThreePointArc((-10.336619, -3.762222), (-10.832885, -1.91013), (-11, 0))
            ThreePointArc((-11, 0), (-10.832885, 1.91013), (-10.336619, 3.762222))
            ThreePointArc((-10.336619, 3.762222), (-9.526279, 5.5), (-8.426489, 7.070664))
            ThreePointArc((-8.426489, 7.070664), (-7.070664, 8.426489), (-5.5, 9.526279))
            ThreePointArc((-5.5, 9.526279), (-3.762222, 10.336619), (-1.91013, 10.832885))
            ThreePointArc((-1.91013, 10.832885), (-0.958713, 10.958142), (0, 11))
            ThreePointArc((0, 11), (0.958713, 10.958142), (1.91013, 10.832885))
        make_face(mode=Mode.SUBTRACT)
        with Locations((19.052559, -11)):
            Circle(F0_R, mode=Mode.SUBTRACT)
        with Locations((-21.665771, 3.82026)):
            Circle(F0_R, mode=Mode.SUBTRACT)
        with Locations((-14.141327, 16.852978)):
            Circle(F0_R, mode=Mode.SUBTRACT)
        with Locations((21.665771, 3.82026)):
            Circle(F0_R, mode=Mode.SUBTRACT)
        with BuildLine():
            ThreePointArc((4.6, 22), (3.252691, 18.747309), (0, 17.4))
            ThreePointArc((0, 17.4), (-3.252691, 25.252691), (4.6, 22))
        make_face(mode=Mode.SUBTRACT)
        with Locations((14.141327, 16.852978)):
            Circle(F0_R, mode=Mode.SUBTRACT)
    extrude(amount=F1_DEPTH)


solid = f1.part
